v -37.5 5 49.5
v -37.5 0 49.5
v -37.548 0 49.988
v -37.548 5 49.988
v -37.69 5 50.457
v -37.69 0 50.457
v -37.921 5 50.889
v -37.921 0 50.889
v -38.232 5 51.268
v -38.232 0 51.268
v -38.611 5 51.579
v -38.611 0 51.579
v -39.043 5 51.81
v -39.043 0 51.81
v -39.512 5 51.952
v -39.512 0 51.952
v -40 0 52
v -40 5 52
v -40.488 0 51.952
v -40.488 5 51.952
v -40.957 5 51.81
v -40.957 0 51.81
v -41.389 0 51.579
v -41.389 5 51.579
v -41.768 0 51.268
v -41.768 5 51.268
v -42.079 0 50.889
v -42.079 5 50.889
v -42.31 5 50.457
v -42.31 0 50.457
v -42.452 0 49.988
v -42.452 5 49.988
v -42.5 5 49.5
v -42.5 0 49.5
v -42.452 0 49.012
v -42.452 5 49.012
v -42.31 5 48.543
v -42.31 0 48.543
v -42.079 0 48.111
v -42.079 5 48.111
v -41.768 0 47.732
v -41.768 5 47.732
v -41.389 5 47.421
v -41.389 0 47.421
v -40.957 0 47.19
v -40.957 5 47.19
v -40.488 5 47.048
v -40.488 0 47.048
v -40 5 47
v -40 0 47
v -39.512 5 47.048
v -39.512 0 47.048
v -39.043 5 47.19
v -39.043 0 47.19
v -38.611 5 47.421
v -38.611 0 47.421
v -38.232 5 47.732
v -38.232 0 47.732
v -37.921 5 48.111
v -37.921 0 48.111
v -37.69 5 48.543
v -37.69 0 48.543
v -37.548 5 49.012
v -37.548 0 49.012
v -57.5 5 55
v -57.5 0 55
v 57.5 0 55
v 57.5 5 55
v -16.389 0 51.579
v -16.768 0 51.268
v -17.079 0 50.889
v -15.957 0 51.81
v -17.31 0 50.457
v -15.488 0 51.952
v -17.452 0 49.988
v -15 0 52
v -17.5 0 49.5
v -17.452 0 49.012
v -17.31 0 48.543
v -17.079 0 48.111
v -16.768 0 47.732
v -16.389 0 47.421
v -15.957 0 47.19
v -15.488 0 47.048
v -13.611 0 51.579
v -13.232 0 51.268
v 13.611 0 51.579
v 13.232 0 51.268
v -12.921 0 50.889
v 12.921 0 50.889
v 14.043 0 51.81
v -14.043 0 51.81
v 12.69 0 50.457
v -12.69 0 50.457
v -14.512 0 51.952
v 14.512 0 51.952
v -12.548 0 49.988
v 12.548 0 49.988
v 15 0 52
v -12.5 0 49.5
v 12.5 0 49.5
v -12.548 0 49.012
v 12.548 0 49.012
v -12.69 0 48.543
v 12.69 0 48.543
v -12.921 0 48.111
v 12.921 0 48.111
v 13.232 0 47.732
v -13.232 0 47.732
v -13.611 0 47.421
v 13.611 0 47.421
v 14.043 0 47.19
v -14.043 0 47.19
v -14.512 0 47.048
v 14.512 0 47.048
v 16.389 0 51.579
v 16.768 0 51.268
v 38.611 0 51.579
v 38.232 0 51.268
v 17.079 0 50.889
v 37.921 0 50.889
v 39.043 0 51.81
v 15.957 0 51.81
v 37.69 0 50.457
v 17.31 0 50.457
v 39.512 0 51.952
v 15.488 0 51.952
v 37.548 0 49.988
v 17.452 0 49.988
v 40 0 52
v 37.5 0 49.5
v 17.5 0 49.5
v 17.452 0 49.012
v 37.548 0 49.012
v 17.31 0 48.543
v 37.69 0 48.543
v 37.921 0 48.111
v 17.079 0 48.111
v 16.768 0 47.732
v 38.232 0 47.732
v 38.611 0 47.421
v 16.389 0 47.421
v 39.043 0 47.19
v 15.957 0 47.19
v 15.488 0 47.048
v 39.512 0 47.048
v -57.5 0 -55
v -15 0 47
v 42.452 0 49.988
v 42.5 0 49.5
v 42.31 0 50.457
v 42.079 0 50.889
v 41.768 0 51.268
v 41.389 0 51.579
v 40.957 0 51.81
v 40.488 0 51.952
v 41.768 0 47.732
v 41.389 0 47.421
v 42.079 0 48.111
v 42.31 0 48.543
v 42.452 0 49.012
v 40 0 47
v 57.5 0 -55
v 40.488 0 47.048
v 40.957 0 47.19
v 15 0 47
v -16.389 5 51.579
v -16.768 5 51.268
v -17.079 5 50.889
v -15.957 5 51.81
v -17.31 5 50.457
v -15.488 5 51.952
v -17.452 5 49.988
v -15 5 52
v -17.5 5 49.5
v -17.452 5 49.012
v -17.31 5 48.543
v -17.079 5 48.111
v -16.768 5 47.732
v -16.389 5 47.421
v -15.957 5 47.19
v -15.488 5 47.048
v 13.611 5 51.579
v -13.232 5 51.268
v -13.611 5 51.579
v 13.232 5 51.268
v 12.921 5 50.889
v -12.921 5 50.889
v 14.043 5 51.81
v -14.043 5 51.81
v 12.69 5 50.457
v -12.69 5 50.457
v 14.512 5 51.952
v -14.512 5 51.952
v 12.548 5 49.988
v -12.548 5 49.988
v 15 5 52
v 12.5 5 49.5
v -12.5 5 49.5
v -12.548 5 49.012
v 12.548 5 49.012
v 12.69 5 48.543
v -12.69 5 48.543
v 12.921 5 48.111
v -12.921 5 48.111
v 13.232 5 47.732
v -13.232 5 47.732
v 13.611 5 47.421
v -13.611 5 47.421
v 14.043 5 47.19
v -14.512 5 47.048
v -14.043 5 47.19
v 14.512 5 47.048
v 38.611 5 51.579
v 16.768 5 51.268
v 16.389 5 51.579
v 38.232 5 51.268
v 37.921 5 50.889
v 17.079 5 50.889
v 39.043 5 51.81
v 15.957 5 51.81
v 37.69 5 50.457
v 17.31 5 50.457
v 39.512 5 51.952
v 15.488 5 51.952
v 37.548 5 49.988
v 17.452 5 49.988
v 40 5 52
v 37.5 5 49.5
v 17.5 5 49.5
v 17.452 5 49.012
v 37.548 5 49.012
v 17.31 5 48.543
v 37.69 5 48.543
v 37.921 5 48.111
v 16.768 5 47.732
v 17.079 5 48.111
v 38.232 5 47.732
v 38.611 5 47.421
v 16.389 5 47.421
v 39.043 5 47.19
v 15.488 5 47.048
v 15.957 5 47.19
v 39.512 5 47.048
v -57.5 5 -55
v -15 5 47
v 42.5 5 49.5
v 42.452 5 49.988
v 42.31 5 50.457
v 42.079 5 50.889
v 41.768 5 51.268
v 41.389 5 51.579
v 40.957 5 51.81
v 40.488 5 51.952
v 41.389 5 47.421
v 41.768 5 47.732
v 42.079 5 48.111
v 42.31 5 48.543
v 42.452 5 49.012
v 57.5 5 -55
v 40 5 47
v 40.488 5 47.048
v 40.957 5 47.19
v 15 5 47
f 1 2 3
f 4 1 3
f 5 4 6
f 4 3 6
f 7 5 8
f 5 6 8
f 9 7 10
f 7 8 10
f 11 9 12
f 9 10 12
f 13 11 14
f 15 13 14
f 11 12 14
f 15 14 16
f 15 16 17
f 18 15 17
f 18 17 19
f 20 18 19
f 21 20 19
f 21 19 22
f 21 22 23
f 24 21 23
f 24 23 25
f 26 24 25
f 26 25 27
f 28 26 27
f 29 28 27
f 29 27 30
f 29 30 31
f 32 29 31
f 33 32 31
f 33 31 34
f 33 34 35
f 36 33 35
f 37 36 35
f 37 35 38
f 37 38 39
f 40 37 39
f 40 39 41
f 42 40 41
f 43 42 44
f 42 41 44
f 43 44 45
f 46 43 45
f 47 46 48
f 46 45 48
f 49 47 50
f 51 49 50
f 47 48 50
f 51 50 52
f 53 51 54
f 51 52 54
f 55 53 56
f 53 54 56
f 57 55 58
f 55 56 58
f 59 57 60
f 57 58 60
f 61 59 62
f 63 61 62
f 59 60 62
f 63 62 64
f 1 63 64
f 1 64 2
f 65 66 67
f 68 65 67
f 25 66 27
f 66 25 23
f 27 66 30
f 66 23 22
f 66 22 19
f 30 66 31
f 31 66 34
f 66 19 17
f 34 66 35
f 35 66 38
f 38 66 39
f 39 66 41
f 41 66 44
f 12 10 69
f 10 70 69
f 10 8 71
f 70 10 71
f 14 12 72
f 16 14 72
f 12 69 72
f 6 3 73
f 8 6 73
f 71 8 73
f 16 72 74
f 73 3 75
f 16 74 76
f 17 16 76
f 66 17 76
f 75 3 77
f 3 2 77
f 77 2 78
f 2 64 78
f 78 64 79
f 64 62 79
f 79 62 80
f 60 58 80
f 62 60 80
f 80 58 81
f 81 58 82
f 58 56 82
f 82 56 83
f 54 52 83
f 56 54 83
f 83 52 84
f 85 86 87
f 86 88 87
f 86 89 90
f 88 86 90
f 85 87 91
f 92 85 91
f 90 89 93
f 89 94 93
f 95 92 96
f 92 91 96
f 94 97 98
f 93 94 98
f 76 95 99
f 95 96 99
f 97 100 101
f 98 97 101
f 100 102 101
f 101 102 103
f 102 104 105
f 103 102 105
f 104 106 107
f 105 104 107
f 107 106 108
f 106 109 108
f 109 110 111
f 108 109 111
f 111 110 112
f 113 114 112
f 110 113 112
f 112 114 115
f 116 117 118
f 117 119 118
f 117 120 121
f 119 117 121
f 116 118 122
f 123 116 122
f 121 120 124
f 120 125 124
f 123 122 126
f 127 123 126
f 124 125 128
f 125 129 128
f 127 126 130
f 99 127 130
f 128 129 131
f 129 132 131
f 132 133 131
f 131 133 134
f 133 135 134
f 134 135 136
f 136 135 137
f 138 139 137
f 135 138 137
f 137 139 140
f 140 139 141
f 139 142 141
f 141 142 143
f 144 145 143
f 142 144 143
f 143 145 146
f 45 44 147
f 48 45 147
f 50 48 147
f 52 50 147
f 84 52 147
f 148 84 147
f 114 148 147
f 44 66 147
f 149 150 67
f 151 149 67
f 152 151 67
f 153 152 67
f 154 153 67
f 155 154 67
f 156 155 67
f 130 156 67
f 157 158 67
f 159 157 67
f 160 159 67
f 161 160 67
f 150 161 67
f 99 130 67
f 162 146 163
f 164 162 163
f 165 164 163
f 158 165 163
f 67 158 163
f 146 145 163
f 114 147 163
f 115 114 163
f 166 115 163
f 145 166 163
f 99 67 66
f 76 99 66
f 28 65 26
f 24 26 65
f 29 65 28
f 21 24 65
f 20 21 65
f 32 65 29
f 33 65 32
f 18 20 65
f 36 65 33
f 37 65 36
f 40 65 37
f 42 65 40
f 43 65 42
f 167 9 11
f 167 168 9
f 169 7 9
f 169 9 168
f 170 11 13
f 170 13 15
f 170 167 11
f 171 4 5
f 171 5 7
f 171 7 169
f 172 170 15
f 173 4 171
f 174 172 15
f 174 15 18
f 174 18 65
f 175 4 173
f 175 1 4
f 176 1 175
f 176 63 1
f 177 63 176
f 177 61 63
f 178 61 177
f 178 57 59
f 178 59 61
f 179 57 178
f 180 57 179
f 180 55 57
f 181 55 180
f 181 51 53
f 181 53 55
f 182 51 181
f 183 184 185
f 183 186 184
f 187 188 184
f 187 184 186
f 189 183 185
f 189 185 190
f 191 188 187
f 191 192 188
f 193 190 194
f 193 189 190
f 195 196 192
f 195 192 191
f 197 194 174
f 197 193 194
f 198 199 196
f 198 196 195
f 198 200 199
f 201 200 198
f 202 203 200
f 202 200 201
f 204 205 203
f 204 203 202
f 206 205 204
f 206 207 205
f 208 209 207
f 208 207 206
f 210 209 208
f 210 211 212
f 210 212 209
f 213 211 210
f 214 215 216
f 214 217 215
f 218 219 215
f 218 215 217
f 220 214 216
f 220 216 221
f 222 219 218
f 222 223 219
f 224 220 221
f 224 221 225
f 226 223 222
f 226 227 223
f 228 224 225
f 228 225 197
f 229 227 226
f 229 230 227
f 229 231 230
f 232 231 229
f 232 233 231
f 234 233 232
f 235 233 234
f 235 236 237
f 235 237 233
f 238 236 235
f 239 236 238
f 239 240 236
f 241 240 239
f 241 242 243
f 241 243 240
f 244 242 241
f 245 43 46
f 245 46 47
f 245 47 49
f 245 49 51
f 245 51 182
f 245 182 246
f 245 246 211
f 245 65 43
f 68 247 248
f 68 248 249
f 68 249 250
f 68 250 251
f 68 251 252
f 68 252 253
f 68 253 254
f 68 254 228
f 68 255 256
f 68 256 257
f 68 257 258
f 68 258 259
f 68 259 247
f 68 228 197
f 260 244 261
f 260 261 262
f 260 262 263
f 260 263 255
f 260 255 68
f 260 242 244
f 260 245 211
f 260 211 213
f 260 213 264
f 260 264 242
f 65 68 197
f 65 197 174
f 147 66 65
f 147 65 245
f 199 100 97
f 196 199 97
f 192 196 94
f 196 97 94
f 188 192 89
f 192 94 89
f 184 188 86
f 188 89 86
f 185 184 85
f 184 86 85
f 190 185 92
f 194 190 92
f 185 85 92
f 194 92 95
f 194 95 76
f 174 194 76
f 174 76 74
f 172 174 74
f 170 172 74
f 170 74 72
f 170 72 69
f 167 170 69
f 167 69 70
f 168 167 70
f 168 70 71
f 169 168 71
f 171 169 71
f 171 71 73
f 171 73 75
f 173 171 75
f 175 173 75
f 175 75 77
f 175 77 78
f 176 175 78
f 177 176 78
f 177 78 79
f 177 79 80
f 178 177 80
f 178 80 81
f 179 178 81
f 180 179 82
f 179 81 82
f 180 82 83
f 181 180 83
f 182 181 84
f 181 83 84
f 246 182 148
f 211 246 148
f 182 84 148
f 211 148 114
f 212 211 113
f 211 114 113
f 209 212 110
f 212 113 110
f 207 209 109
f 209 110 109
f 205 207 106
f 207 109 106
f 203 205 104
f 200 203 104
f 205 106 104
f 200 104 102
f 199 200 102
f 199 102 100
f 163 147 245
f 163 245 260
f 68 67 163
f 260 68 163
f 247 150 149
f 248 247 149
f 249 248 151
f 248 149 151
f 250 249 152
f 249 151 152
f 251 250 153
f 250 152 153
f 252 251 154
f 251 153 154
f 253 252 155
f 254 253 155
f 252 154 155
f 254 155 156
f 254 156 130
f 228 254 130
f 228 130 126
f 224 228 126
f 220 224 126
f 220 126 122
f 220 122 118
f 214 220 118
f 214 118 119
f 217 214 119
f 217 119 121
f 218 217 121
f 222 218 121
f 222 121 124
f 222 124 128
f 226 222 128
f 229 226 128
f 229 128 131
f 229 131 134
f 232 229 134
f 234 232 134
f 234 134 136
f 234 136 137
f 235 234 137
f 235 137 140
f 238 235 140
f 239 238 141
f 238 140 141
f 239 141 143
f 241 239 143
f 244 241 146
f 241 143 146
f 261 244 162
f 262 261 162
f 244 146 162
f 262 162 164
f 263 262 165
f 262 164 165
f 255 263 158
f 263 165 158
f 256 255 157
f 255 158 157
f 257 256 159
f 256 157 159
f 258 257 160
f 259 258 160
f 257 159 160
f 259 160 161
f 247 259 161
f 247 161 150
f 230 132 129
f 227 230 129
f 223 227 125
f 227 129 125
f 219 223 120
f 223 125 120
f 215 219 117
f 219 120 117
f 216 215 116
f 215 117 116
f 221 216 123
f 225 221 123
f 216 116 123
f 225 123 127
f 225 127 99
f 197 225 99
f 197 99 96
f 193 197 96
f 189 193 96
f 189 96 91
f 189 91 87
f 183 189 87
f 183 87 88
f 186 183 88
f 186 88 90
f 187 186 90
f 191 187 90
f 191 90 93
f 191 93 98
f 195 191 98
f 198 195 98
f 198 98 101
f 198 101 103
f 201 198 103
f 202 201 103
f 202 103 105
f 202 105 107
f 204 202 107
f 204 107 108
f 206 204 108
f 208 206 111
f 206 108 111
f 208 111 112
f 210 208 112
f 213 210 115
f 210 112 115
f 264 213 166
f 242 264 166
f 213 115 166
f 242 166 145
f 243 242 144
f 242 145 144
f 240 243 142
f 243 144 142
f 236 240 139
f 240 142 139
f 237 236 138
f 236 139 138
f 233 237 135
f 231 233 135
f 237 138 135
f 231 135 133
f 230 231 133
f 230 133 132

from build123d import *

# Parameters (mm, degrees)
SKETCH2_W           = 115
SKETCH2_H           = 110
BOSS_EXTRUDE1_DEPTH = 5
CUT_EXTRUDE1_REACH  = 7
SKETCH3_R           = 2.5


with BuildPart() as part:
    # Sketch2 → Boss-Extrude1 (new body)
    with BuildSketch(Plane(origin=(0, 0, 0), x_dir=(1, 0, 0), z_dir=(0, 1, 0))):
        Rectangle(SKETCH2_W, SKETCH2_H)
    extrude(amount=BOSS_EXTRUDE1_DEPTH)

    # Sketch3 → Cut-Extrude1 (cut, up to next)
    with BuildSketch(Plane.XZ, mode=Mode.PRIVATE) as cut_extrude1_sk1:
        with Locations((-40, 49.5)):
            Circle(SKETCH3_R)
    cut_extrude1_tool1 = extrude(cut_extrude1_sk1.sketch, amount=-CUT_EXTRUDE1_REACH, mode=Mode.PRIVATE) & part.part
    add(cut_extrude1_tool1.solids().sort_by_distance((-40, 0, 49.5))[0], mode=Mode.SUBTRACT)
    # Sketch3 → Cut-Extrude1 (cut, up to next)
    with BuildSketch(Plane.XZ, mode=Mode.PRIVATE) as cut_extrude1_sk2:
        with Locations((-15, 49.5)):
            Circle(SKETCH3_R)
    cut_extrude1_tool2 = extrude(cut_extrude1_sk2.sketch, amount=-CUT_EXTRUDE1_REACH, mode=Mode.PRIVATE) & part.part
    add(cut_extrude1_tool2.solids().sort_by_distance((-15, 0, 49.5))[0], mode=Mode.SUBTRACT)
    # Sketch3 → Cut-Extrude1 (cut, up to next)
    with BuildSketch(Plane.XZ, mode=Mode.PRIVATE) as cut_extrude1_sk3:
        with Locations((40, 49.5)):
            Circle(SKETCH3_R)
    cut_extrude1_tool3 = extrude(cut_extrude1_sk3.sketch, amount=-CUT_EXTRUDE1_REACH, mode=Mode.PRIVATE) & part.part
    add(cut_extrude1_tool3.solids().sort_by_distance((40, 0, 49.5))[0], mode=Mode.SUBTRACT)
    # Sketch3 → Cut-Extrude1 (cut, up to next)
    with BuildSketch(Plane.XZ, mode=Mode.PRIVATE) as cut_extrude1_sk4:
        with Locations((15, 49.5)):
            Circle(SKETCH3_R)
    cut_extrude1_tool4 = extrude(cut_extrude1_sk4.sketch, amount=-CUT_EXTRUDE1_REACH, mode=Mode.PRIVATE) & part.part
    add(cut_extrude1_tool4.solids().sort_by_distance((15, 0, 49.5))[0], mode=Mode.SUBTRACT)


solid = part.part
